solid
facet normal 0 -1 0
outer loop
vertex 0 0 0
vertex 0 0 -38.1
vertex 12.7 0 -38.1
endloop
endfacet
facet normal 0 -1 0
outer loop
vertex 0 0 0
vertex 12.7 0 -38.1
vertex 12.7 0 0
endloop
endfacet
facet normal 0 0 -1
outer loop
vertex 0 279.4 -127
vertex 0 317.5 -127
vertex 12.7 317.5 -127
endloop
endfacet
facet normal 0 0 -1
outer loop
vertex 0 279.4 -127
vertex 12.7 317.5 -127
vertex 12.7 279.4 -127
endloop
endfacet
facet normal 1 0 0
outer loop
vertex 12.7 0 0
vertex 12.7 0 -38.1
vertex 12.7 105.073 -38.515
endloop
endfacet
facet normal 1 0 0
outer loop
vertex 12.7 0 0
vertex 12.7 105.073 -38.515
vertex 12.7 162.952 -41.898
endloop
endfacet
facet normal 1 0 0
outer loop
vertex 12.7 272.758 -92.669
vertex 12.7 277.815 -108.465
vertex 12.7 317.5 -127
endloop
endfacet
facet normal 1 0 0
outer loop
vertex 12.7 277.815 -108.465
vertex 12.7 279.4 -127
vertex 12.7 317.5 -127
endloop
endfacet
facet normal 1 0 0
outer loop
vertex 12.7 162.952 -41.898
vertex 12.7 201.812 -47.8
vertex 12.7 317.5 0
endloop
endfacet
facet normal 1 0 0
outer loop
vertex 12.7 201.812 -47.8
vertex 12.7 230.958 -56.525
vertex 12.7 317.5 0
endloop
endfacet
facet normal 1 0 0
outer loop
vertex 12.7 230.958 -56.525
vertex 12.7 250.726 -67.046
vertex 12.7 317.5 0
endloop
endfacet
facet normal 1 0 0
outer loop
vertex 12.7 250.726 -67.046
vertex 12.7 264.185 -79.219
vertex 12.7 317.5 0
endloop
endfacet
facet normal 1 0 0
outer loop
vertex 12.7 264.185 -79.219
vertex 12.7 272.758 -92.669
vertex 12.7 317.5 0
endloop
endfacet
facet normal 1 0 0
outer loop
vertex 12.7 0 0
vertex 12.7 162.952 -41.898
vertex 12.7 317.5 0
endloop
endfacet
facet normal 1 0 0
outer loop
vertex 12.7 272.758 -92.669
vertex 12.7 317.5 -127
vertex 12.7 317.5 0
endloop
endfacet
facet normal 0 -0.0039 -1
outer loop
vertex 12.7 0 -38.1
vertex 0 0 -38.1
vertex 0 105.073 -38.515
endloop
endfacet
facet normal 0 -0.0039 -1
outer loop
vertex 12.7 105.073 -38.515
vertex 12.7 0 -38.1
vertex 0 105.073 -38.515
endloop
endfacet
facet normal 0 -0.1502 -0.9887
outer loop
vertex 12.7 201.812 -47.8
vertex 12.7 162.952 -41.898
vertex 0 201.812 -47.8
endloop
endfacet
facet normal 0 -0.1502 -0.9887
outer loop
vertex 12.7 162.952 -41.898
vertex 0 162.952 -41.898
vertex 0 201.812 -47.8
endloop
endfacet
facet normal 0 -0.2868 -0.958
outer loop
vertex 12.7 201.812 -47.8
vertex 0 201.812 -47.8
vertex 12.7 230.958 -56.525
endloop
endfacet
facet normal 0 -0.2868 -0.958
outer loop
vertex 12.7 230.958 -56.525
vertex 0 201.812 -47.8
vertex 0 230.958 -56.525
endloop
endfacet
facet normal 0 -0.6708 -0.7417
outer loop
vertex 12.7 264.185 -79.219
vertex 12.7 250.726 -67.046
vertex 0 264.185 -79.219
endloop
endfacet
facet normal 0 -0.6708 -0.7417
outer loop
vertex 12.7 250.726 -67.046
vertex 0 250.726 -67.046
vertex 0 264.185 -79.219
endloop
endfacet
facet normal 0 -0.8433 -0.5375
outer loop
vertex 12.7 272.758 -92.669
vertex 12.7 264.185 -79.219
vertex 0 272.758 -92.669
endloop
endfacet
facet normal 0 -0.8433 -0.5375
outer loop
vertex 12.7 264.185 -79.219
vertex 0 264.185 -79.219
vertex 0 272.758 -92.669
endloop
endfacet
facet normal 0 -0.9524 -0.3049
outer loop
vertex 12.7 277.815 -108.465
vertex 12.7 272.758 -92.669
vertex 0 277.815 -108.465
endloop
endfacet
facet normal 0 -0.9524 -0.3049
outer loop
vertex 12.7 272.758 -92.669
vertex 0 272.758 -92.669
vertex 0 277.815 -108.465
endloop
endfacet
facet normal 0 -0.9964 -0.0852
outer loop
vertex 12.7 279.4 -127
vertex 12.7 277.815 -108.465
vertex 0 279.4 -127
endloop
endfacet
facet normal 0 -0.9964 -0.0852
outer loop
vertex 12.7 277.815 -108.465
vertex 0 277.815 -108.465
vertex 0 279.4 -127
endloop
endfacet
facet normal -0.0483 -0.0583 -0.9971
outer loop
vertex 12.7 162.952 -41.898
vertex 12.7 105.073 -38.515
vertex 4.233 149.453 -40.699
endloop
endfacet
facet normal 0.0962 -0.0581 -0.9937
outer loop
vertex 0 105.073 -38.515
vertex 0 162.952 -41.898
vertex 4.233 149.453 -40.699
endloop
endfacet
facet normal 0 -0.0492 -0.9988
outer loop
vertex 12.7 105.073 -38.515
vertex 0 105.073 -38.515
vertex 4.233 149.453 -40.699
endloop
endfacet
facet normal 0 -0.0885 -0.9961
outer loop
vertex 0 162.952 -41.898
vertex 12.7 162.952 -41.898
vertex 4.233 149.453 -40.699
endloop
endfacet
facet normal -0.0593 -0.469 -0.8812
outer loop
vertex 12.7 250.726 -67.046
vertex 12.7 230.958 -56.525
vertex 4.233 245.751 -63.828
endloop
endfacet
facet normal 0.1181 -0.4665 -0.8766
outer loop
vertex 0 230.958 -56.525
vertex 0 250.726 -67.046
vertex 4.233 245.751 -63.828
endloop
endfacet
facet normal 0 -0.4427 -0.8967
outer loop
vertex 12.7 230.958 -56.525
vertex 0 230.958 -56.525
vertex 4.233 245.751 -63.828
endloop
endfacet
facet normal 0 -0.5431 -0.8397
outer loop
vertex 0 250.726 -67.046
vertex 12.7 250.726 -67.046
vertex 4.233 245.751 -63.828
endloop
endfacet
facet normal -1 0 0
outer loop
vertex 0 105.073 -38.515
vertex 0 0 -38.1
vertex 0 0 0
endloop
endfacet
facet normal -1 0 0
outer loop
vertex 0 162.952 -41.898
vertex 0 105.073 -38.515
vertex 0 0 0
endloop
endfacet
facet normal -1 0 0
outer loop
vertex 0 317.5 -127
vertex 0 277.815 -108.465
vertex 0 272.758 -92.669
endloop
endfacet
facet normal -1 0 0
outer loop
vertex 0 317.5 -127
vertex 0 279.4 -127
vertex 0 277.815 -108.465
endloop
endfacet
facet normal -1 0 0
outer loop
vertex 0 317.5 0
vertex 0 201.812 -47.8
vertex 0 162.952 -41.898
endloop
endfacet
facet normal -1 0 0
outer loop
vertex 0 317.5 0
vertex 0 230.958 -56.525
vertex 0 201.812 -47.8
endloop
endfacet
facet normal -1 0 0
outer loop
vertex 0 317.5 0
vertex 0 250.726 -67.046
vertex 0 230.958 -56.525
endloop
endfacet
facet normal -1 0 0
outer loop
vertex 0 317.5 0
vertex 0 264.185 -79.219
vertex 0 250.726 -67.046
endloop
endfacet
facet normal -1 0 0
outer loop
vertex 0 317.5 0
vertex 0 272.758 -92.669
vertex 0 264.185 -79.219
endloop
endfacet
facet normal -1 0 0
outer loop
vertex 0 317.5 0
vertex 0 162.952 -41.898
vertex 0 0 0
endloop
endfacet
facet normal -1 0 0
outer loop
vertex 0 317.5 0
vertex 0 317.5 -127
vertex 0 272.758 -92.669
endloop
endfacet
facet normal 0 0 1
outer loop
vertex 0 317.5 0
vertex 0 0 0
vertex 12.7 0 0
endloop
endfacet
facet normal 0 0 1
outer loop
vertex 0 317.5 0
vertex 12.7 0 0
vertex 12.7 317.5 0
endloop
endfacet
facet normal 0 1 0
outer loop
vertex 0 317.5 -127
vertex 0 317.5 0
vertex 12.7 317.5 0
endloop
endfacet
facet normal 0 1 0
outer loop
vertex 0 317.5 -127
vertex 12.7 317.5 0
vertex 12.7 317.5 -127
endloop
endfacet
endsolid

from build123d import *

# Parameters (mm, degrees)
BOSS_EXTRUDE1_DEPTH = 12.7


with BuildPart() as part:
    # Sketch1 → Boss-Extrude1 (new body)
    with BuildSketch(Plane(origin=(0, 0, 0), x_dir=(0, 0, -1), z_dir=(1, 0, 0))):
        with BuildLine():
            Line((0, 0), (0, 317.5))
            Line((0, 317.5), (127, 317.5))
            Line((127, 317.5), (127, 279.4))
            add(Edge.make_bspline(
                [(38.1, 0), (36.939409863, 172.867425699), (37.301191912, 280.238281825), (127, 279.4)],
                knots=[0, 0, 0, 0, 1, 1, 1, 1], degree=3))
            Line((38.1, 0), (0, 0))
        make_face()
    extrude(amount=BOSS_EXTRUDE1_DEPTH)


solid = part.part
